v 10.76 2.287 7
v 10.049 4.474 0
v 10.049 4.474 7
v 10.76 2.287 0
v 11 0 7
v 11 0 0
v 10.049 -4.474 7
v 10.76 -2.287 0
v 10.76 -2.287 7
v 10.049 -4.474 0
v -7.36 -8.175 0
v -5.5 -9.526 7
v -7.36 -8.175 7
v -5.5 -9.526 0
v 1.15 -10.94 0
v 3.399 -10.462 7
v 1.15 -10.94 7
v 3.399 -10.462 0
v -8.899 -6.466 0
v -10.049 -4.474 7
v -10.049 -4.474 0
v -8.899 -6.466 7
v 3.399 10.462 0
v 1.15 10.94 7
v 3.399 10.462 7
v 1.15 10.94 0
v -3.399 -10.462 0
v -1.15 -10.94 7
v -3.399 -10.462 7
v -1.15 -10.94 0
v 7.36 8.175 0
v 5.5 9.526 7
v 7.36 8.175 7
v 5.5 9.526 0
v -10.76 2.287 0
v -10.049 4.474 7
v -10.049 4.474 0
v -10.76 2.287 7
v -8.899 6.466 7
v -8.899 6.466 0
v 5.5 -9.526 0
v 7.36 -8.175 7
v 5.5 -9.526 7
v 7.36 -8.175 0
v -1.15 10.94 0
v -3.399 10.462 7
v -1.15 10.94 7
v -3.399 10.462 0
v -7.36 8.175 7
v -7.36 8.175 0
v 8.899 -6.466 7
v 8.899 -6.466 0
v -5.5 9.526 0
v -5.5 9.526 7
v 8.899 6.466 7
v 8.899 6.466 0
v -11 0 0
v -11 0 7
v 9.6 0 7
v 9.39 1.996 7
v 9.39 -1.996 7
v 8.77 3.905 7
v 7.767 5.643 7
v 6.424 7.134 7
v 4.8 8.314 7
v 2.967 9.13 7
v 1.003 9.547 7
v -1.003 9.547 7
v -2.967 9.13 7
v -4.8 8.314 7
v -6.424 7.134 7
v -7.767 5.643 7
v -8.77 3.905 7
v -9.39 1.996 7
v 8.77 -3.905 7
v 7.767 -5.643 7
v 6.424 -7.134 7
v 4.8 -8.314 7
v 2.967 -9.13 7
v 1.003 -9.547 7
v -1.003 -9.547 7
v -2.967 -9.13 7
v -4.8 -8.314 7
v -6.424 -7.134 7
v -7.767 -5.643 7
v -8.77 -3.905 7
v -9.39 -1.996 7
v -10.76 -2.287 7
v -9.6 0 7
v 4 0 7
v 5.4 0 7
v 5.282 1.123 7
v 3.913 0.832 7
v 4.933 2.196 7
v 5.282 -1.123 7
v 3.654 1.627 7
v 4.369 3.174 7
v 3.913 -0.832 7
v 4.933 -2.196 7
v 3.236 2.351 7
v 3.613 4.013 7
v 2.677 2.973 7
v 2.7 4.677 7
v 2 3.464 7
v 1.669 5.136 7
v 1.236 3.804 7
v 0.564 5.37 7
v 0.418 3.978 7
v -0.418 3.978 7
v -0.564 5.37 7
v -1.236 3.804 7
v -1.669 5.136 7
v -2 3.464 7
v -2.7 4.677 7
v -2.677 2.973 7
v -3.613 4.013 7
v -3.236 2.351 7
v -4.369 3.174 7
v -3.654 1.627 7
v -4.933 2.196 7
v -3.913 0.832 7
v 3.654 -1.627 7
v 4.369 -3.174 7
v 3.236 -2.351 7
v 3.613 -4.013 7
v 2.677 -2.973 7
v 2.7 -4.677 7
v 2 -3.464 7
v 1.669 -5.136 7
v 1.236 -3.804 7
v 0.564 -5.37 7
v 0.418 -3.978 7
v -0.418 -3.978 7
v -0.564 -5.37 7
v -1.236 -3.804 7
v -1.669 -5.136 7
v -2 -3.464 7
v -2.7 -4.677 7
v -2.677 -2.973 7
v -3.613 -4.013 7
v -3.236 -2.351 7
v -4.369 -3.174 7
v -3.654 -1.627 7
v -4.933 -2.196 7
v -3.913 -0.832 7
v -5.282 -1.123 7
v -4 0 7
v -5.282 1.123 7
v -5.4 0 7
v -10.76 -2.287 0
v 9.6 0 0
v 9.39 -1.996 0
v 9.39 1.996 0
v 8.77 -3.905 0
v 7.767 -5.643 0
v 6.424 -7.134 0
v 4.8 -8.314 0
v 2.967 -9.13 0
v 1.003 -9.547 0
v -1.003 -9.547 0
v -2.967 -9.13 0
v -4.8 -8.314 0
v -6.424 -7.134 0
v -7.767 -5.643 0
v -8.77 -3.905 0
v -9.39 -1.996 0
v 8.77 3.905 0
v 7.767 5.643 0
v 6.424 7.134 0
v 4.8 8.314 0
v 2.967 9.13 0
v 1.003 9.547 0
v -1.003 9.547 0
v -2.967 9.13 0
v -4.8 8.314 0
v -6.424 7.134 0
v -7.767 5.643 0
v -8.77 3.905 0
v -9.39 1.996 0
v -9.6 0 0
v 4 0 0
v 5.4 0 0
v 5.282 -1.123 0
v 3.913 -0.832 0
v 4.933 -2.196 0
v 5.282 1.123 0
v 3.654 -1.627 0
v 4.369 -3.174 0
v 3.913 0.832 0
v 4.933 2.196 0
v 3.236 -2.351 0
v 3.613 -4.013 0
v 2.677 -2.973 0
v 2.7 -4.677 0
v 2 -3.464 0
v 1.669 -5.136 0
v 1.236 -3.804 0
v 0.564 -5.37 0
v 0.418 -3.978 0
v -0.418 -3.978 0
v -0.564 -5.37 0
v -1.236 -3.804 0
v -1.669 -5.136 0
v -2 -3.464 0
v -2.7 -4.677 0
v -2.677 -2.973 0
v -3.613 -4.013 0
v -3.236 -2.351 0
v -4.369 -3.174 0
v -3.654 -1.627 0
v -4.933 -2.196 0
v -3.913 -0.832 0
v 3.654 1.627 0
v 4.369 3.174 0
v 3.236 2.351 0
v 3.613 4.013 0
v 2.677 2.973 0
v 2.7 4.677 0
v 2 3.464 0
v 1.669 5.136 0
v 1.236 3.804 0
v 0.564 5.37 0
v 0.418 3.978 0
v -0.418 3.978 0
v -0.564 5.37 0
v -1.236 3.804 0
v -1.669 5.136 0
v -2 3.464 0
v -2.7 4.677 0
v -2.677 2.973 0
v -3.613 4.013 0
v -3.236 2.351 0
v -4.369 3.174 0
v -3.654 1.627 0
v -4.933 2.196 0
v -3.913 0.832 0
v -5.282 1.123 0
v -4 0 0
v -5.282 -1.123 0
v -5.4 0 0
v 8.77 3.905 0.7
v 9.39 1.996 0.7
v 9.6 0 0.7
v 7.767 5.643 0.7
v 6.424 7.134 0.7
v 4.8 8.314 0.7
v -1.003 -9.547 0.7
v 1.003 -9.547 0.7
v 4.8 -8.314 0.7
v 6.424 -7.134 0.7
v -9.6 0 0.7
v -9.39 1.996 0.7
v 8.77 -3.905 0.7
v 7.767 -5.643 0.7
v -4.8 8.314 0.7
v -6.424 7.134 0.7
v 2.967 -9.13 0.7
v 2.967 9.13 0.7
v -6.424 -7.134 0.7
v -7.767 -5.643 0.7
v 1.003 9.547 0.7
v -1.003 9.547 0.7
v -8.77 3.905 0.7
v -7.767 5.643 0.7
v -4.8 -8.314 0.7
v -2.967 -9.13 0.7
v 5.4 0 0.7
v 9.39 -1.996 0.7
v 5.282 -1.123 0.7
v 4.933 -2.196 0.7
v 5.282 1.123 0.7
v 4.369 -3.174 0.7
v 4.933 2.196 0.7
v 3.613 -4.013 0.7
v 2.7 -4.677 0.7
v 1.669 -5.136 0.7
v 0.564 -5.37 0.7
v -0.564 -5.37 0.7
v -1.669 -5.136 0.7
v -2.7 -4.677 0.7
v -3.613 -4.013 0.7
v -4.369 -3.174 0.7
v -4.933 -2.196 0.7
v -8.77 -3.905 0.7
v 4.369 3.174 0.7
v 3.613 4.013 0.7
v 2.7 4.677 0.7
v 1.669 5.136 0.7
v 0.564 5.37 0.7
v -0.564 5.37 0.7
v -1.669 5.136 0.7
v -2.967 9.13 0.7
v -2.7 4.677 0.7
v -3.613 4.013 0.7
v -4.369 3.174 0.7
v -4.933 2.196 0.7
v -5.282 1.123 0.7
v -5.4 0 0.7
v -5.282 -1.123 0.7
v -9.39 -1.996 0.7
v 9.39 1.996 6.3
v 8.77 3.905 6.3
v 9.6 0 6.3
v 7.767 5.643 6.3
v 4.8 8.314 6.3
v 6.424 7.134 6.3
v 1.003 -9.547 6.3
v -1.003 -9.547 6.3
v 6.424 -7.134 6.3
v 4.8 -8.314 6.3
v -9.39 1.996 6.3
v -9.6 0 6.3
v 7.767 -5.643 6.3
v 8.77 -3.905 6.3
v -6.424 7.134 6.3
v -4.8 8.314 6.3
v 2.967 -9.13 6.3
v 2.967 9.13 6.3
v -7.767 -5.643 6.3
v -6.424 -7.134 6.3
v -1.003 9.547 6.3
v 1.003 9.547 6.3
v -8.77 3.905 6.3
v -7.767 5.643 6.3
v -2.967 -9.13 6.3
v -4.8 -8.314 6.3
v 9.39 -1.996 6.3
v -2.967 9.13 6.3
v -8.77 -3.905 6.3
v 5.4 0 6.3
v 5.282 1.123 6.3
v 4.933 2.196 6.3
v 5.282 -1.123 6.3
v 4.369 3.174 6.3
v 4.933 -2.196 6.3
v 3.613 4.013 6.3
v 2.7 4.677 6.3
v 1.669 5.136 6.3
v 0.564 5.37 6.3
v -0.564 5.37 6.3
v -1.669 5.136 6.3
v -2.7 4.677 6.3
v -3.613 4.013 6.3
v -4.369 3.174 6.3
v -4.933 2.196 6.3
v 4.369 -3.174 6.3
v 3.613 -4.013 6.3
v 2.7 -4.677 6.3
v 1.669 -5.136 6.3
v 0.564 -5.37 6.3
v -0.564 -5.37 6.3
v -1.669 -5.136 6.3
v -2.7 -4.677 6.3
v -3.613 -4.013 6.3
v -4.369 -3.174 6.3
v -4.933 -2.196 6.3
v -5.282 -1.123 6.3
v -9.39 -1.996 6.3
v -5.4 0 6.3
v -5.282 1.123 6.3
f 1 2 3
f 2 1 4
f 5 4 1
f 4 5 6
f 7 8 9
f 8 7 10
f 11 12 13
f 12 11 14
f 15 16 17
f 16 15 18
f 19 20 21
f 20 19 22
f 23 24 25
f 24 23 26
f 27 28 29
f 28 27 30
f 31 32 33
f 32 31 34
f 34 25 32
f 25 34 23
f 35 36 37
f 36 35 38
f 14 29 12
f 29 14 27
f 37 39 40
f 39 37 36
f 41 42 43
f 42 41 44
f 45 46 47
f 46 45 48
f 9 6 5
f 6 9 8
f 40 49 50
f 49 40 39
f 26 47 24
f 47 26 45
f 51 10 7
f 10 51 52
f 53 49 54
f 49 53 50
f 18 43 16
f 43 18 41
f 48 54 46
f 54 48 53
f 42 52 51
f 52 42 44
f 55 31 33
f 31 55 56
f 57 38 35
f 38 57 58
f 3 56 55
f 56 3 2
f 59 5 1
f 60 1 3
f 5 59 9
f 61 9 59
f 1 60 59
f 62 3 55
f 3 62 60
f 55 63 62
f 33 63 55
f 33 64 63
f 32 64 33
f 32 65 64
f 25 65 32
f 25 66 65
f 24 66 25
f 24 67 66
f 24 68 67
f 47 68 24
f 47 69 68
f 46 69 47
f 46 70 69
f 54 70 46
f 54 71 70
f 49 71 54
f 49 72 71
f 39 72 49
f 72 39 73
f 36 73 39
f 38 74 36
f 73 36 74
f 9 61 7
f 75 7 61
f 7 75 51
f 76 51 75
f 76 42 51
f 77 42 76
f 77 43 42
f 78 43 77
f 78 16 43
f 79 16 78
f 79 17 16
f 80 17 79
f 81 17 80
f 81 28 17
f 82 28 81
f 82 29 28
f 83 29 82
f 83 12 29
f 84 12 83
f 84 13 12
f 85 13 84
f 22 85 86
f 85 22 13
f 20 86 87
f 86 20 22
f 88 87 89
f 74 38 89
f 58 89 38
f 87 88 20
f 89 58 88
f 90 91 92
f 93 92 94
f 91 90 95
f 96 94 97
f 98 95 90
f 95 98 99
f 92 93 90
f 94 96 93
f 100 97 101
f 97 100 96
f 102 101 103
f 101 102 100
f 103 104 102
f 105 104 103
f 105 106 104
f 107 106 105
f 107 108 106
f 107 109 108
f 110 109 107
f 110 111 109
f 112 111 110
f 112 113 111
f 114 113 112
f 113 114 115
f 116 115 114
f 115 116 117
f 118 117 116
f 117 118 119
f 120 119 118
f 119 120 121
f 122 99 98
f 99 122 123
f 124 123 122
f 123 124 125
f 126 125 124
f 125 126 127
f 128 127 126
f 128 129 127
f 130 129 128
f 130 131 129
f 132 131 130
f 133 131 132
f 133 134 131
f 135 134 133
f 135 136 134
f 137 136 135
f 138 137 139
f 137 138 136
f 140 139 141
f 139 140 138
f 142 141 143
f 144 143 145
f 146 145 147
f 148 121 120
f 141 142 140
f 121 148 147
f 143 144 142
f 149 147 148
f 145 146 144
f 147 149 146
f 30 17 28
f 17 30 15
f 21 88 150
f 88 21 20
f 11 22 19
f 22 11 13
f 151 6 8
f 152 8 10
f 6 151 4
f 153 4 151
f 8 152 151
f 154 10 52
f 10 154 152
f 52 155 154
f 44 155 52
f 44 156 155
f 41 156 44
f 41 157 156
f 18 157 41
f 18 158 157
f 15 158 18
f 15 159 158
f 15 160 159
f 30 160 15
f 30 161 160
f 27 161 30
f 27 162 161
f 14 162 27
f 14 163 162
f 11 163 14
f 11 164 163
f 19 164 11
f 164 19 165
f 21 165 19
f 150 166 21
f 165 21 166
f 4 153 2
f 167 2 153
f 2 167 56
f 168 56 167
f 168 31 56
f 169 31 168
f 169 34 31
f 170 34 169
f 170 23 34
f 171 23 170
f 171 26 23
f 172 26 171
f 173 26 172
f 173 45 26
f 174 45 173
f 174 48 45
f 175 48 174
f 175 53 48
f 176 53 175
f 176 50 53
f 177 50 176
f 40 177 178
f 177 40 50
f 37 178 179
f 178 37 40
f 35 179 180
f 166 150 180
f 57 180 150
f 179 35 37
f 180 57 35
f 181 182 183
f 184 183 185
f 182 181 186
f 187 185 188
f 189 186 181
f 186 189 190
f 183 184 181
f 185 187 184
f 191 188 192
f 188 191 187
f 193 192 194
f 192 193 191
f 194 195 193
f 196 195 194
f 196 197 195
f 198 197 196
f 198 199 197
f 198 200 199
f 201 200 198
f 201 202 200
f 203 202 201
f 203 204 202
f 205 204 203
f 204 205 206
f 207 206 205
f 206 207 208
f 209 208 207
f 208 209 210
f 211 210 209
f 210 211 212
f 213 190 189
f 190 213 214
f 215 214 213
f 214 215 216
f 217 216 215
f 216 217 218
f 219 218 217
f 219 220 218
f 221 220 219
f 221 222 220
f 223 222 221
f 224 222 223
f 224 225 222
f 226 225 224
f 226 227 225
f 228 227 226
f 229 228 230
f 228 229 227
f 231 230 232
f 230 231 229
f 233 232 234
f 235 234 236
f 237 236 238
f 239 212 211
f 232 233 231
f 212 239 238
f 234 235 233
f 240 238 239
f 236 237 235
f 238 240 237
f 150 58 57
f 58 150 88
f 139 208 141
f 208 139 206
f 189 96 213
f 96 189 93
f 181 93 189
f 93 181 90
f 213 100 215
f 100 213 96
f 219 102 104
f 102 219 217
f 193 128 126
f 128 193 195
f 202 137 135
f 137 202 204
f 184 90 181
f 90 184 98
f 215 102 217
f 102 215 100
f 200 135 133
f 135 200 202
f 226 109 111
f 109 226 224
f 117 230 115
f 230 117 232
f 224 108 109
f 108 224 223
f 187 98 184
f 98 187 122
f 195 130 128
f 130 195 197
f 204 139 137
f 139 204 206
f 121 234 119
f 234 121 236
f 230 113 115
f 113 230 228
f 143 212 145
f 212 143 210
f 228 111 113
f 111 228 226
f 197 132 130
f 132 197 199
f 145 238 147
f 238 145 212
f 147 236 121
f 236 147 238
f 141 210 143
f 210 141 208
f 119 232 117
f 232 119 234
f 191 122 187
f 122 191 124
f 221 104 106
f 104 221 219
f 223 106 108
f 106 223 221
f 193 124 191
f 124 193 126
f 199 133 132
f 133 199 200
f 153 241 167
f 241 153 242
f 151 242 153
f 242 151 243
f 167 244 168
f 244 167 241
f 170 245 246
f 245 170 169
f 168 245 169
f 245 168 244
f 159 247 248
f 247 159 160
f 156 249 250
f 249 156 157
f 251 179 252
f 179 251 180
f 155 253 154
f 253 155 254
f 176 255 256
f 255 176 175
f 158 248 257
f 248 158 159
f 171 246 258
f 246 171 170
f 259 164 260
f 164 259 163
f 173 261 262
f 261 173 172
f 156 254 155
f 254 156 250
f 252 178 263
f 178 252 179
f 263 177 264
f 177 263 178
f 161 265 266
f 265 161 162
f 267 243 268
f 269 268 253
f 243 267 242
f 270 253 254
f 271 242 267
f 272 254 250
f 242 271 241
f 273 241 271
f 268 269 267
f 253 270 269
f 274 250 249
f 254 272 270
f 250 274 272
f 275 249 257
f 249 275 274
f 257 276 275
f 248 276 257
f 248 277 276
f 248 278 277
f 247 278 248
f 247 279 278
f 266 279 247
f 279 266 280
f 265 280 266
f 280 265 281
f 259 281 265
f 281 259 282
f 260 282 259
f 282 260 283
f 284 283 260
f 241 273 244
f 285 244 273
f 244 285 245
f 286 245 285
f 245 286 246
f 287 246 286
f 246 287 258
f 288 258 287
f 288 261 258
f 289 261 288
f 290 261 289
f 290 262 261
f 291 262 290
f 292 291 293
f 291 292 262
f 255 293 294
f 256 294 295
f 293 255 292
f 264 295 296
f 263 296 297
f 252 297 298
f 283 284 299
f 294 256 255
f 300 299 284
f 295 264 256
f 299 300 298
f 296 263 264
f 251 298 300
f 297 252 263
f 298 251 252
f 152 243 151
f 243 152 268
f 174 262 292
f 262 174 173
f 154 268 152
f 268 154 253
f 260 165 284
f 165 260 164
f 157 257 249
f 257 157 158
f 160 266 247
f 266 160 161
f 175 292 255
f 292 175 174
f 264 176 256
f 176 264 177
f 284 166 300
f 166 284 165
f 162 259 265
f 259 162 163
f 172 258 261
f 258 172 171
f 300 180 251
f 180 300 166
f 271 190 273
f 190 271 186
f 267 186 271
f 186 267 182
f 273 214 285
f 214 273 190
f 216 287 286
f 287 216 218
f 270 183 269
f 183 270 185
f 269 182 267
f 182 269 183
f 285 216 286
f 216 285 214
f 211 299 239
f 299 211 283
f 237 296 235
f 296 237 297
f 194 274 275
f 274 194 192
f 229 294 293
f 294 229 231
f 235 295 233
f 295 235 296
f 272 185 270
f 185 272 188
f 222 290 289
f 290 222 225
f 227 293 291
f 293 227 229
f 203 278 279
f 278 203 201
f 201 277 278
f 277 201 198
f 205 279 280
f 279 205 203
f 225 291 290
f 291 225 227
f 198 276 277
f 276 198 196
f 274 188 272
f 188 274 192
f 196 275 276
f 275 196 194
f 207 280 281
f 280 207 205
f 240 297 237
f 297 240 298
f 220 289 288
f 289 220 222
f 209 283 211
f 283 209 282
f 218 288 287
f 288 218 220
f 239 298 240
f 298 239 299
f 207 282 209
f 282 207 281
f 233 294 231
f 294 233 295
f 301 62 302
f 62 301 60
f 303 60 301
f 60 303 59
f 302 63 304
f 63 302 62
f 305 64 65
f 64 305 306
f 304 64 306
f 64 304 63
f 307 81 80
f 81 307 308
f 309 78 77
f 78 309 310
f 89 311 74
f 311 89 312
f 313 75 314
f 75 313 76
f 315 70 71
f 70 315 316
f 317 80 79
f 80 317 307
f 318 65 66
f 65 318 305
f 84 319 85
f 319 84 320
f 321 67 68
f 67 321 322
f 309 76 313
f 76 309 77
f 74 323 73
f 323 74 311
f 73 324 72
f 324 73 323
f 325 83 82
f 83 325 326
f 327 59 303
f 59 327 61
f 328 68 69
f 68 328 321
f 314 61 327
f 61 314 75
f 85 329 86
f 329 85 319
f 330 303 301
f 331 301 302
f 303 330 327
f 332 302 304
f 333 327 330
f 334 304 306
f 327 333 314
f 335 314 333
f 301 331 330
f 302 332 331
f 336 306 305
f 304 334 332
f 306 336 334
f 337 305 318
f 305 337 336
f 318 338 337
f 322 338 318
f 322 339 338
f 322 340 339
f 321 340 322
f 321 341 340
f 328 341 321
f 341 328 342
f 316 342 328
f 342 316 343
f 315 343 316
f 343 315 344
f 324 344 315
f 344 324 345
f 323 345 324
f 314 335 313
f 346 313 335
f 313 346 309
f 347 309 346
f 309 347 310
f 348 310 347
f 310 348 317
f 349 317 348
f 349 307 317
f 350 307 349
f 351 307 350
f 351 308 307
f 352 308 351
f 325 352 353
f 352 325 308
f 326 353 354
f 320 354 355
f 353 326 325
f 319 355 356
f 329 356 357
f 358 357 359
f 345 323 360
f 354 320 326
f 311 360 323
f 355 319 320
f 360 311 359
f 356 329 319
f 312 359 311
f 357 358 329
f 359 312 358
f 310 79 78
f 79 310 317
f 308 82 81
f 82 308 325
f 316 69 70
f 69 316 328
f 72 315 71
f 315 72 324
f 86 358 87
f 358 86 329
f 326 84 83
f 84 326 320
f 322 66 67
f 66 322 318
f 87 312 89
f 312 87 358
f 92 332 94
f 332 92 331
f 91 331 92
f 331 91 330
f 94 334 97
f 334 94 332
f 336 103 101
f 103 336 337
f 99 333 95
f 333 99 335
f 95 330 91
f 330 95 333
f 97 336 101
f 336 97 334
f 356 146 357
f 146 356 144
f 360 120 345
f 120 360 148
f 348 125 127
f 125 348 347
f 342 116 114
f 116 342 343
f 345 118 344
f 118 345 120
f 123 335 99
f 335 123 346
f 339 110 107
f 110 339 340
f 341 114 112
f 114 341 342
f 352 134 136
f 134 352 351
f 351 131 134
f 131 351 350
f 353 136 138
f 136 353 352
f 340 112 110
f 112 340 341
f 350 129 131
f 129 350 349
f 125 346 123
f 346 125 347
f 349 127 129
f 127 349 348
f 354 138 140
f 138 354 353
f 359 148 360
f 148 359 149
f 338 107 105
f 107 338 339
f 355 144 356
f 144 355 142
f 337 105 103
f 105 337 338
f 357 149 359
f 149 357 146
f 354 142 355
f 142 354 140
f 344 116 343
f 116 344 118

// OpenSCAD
// NAME: Bearing 608
// CATEGORY: Bearing
// COLOR: 493

include <MCAD/bearing.scad>
bearing(pos=[0,0,0], model=608);
